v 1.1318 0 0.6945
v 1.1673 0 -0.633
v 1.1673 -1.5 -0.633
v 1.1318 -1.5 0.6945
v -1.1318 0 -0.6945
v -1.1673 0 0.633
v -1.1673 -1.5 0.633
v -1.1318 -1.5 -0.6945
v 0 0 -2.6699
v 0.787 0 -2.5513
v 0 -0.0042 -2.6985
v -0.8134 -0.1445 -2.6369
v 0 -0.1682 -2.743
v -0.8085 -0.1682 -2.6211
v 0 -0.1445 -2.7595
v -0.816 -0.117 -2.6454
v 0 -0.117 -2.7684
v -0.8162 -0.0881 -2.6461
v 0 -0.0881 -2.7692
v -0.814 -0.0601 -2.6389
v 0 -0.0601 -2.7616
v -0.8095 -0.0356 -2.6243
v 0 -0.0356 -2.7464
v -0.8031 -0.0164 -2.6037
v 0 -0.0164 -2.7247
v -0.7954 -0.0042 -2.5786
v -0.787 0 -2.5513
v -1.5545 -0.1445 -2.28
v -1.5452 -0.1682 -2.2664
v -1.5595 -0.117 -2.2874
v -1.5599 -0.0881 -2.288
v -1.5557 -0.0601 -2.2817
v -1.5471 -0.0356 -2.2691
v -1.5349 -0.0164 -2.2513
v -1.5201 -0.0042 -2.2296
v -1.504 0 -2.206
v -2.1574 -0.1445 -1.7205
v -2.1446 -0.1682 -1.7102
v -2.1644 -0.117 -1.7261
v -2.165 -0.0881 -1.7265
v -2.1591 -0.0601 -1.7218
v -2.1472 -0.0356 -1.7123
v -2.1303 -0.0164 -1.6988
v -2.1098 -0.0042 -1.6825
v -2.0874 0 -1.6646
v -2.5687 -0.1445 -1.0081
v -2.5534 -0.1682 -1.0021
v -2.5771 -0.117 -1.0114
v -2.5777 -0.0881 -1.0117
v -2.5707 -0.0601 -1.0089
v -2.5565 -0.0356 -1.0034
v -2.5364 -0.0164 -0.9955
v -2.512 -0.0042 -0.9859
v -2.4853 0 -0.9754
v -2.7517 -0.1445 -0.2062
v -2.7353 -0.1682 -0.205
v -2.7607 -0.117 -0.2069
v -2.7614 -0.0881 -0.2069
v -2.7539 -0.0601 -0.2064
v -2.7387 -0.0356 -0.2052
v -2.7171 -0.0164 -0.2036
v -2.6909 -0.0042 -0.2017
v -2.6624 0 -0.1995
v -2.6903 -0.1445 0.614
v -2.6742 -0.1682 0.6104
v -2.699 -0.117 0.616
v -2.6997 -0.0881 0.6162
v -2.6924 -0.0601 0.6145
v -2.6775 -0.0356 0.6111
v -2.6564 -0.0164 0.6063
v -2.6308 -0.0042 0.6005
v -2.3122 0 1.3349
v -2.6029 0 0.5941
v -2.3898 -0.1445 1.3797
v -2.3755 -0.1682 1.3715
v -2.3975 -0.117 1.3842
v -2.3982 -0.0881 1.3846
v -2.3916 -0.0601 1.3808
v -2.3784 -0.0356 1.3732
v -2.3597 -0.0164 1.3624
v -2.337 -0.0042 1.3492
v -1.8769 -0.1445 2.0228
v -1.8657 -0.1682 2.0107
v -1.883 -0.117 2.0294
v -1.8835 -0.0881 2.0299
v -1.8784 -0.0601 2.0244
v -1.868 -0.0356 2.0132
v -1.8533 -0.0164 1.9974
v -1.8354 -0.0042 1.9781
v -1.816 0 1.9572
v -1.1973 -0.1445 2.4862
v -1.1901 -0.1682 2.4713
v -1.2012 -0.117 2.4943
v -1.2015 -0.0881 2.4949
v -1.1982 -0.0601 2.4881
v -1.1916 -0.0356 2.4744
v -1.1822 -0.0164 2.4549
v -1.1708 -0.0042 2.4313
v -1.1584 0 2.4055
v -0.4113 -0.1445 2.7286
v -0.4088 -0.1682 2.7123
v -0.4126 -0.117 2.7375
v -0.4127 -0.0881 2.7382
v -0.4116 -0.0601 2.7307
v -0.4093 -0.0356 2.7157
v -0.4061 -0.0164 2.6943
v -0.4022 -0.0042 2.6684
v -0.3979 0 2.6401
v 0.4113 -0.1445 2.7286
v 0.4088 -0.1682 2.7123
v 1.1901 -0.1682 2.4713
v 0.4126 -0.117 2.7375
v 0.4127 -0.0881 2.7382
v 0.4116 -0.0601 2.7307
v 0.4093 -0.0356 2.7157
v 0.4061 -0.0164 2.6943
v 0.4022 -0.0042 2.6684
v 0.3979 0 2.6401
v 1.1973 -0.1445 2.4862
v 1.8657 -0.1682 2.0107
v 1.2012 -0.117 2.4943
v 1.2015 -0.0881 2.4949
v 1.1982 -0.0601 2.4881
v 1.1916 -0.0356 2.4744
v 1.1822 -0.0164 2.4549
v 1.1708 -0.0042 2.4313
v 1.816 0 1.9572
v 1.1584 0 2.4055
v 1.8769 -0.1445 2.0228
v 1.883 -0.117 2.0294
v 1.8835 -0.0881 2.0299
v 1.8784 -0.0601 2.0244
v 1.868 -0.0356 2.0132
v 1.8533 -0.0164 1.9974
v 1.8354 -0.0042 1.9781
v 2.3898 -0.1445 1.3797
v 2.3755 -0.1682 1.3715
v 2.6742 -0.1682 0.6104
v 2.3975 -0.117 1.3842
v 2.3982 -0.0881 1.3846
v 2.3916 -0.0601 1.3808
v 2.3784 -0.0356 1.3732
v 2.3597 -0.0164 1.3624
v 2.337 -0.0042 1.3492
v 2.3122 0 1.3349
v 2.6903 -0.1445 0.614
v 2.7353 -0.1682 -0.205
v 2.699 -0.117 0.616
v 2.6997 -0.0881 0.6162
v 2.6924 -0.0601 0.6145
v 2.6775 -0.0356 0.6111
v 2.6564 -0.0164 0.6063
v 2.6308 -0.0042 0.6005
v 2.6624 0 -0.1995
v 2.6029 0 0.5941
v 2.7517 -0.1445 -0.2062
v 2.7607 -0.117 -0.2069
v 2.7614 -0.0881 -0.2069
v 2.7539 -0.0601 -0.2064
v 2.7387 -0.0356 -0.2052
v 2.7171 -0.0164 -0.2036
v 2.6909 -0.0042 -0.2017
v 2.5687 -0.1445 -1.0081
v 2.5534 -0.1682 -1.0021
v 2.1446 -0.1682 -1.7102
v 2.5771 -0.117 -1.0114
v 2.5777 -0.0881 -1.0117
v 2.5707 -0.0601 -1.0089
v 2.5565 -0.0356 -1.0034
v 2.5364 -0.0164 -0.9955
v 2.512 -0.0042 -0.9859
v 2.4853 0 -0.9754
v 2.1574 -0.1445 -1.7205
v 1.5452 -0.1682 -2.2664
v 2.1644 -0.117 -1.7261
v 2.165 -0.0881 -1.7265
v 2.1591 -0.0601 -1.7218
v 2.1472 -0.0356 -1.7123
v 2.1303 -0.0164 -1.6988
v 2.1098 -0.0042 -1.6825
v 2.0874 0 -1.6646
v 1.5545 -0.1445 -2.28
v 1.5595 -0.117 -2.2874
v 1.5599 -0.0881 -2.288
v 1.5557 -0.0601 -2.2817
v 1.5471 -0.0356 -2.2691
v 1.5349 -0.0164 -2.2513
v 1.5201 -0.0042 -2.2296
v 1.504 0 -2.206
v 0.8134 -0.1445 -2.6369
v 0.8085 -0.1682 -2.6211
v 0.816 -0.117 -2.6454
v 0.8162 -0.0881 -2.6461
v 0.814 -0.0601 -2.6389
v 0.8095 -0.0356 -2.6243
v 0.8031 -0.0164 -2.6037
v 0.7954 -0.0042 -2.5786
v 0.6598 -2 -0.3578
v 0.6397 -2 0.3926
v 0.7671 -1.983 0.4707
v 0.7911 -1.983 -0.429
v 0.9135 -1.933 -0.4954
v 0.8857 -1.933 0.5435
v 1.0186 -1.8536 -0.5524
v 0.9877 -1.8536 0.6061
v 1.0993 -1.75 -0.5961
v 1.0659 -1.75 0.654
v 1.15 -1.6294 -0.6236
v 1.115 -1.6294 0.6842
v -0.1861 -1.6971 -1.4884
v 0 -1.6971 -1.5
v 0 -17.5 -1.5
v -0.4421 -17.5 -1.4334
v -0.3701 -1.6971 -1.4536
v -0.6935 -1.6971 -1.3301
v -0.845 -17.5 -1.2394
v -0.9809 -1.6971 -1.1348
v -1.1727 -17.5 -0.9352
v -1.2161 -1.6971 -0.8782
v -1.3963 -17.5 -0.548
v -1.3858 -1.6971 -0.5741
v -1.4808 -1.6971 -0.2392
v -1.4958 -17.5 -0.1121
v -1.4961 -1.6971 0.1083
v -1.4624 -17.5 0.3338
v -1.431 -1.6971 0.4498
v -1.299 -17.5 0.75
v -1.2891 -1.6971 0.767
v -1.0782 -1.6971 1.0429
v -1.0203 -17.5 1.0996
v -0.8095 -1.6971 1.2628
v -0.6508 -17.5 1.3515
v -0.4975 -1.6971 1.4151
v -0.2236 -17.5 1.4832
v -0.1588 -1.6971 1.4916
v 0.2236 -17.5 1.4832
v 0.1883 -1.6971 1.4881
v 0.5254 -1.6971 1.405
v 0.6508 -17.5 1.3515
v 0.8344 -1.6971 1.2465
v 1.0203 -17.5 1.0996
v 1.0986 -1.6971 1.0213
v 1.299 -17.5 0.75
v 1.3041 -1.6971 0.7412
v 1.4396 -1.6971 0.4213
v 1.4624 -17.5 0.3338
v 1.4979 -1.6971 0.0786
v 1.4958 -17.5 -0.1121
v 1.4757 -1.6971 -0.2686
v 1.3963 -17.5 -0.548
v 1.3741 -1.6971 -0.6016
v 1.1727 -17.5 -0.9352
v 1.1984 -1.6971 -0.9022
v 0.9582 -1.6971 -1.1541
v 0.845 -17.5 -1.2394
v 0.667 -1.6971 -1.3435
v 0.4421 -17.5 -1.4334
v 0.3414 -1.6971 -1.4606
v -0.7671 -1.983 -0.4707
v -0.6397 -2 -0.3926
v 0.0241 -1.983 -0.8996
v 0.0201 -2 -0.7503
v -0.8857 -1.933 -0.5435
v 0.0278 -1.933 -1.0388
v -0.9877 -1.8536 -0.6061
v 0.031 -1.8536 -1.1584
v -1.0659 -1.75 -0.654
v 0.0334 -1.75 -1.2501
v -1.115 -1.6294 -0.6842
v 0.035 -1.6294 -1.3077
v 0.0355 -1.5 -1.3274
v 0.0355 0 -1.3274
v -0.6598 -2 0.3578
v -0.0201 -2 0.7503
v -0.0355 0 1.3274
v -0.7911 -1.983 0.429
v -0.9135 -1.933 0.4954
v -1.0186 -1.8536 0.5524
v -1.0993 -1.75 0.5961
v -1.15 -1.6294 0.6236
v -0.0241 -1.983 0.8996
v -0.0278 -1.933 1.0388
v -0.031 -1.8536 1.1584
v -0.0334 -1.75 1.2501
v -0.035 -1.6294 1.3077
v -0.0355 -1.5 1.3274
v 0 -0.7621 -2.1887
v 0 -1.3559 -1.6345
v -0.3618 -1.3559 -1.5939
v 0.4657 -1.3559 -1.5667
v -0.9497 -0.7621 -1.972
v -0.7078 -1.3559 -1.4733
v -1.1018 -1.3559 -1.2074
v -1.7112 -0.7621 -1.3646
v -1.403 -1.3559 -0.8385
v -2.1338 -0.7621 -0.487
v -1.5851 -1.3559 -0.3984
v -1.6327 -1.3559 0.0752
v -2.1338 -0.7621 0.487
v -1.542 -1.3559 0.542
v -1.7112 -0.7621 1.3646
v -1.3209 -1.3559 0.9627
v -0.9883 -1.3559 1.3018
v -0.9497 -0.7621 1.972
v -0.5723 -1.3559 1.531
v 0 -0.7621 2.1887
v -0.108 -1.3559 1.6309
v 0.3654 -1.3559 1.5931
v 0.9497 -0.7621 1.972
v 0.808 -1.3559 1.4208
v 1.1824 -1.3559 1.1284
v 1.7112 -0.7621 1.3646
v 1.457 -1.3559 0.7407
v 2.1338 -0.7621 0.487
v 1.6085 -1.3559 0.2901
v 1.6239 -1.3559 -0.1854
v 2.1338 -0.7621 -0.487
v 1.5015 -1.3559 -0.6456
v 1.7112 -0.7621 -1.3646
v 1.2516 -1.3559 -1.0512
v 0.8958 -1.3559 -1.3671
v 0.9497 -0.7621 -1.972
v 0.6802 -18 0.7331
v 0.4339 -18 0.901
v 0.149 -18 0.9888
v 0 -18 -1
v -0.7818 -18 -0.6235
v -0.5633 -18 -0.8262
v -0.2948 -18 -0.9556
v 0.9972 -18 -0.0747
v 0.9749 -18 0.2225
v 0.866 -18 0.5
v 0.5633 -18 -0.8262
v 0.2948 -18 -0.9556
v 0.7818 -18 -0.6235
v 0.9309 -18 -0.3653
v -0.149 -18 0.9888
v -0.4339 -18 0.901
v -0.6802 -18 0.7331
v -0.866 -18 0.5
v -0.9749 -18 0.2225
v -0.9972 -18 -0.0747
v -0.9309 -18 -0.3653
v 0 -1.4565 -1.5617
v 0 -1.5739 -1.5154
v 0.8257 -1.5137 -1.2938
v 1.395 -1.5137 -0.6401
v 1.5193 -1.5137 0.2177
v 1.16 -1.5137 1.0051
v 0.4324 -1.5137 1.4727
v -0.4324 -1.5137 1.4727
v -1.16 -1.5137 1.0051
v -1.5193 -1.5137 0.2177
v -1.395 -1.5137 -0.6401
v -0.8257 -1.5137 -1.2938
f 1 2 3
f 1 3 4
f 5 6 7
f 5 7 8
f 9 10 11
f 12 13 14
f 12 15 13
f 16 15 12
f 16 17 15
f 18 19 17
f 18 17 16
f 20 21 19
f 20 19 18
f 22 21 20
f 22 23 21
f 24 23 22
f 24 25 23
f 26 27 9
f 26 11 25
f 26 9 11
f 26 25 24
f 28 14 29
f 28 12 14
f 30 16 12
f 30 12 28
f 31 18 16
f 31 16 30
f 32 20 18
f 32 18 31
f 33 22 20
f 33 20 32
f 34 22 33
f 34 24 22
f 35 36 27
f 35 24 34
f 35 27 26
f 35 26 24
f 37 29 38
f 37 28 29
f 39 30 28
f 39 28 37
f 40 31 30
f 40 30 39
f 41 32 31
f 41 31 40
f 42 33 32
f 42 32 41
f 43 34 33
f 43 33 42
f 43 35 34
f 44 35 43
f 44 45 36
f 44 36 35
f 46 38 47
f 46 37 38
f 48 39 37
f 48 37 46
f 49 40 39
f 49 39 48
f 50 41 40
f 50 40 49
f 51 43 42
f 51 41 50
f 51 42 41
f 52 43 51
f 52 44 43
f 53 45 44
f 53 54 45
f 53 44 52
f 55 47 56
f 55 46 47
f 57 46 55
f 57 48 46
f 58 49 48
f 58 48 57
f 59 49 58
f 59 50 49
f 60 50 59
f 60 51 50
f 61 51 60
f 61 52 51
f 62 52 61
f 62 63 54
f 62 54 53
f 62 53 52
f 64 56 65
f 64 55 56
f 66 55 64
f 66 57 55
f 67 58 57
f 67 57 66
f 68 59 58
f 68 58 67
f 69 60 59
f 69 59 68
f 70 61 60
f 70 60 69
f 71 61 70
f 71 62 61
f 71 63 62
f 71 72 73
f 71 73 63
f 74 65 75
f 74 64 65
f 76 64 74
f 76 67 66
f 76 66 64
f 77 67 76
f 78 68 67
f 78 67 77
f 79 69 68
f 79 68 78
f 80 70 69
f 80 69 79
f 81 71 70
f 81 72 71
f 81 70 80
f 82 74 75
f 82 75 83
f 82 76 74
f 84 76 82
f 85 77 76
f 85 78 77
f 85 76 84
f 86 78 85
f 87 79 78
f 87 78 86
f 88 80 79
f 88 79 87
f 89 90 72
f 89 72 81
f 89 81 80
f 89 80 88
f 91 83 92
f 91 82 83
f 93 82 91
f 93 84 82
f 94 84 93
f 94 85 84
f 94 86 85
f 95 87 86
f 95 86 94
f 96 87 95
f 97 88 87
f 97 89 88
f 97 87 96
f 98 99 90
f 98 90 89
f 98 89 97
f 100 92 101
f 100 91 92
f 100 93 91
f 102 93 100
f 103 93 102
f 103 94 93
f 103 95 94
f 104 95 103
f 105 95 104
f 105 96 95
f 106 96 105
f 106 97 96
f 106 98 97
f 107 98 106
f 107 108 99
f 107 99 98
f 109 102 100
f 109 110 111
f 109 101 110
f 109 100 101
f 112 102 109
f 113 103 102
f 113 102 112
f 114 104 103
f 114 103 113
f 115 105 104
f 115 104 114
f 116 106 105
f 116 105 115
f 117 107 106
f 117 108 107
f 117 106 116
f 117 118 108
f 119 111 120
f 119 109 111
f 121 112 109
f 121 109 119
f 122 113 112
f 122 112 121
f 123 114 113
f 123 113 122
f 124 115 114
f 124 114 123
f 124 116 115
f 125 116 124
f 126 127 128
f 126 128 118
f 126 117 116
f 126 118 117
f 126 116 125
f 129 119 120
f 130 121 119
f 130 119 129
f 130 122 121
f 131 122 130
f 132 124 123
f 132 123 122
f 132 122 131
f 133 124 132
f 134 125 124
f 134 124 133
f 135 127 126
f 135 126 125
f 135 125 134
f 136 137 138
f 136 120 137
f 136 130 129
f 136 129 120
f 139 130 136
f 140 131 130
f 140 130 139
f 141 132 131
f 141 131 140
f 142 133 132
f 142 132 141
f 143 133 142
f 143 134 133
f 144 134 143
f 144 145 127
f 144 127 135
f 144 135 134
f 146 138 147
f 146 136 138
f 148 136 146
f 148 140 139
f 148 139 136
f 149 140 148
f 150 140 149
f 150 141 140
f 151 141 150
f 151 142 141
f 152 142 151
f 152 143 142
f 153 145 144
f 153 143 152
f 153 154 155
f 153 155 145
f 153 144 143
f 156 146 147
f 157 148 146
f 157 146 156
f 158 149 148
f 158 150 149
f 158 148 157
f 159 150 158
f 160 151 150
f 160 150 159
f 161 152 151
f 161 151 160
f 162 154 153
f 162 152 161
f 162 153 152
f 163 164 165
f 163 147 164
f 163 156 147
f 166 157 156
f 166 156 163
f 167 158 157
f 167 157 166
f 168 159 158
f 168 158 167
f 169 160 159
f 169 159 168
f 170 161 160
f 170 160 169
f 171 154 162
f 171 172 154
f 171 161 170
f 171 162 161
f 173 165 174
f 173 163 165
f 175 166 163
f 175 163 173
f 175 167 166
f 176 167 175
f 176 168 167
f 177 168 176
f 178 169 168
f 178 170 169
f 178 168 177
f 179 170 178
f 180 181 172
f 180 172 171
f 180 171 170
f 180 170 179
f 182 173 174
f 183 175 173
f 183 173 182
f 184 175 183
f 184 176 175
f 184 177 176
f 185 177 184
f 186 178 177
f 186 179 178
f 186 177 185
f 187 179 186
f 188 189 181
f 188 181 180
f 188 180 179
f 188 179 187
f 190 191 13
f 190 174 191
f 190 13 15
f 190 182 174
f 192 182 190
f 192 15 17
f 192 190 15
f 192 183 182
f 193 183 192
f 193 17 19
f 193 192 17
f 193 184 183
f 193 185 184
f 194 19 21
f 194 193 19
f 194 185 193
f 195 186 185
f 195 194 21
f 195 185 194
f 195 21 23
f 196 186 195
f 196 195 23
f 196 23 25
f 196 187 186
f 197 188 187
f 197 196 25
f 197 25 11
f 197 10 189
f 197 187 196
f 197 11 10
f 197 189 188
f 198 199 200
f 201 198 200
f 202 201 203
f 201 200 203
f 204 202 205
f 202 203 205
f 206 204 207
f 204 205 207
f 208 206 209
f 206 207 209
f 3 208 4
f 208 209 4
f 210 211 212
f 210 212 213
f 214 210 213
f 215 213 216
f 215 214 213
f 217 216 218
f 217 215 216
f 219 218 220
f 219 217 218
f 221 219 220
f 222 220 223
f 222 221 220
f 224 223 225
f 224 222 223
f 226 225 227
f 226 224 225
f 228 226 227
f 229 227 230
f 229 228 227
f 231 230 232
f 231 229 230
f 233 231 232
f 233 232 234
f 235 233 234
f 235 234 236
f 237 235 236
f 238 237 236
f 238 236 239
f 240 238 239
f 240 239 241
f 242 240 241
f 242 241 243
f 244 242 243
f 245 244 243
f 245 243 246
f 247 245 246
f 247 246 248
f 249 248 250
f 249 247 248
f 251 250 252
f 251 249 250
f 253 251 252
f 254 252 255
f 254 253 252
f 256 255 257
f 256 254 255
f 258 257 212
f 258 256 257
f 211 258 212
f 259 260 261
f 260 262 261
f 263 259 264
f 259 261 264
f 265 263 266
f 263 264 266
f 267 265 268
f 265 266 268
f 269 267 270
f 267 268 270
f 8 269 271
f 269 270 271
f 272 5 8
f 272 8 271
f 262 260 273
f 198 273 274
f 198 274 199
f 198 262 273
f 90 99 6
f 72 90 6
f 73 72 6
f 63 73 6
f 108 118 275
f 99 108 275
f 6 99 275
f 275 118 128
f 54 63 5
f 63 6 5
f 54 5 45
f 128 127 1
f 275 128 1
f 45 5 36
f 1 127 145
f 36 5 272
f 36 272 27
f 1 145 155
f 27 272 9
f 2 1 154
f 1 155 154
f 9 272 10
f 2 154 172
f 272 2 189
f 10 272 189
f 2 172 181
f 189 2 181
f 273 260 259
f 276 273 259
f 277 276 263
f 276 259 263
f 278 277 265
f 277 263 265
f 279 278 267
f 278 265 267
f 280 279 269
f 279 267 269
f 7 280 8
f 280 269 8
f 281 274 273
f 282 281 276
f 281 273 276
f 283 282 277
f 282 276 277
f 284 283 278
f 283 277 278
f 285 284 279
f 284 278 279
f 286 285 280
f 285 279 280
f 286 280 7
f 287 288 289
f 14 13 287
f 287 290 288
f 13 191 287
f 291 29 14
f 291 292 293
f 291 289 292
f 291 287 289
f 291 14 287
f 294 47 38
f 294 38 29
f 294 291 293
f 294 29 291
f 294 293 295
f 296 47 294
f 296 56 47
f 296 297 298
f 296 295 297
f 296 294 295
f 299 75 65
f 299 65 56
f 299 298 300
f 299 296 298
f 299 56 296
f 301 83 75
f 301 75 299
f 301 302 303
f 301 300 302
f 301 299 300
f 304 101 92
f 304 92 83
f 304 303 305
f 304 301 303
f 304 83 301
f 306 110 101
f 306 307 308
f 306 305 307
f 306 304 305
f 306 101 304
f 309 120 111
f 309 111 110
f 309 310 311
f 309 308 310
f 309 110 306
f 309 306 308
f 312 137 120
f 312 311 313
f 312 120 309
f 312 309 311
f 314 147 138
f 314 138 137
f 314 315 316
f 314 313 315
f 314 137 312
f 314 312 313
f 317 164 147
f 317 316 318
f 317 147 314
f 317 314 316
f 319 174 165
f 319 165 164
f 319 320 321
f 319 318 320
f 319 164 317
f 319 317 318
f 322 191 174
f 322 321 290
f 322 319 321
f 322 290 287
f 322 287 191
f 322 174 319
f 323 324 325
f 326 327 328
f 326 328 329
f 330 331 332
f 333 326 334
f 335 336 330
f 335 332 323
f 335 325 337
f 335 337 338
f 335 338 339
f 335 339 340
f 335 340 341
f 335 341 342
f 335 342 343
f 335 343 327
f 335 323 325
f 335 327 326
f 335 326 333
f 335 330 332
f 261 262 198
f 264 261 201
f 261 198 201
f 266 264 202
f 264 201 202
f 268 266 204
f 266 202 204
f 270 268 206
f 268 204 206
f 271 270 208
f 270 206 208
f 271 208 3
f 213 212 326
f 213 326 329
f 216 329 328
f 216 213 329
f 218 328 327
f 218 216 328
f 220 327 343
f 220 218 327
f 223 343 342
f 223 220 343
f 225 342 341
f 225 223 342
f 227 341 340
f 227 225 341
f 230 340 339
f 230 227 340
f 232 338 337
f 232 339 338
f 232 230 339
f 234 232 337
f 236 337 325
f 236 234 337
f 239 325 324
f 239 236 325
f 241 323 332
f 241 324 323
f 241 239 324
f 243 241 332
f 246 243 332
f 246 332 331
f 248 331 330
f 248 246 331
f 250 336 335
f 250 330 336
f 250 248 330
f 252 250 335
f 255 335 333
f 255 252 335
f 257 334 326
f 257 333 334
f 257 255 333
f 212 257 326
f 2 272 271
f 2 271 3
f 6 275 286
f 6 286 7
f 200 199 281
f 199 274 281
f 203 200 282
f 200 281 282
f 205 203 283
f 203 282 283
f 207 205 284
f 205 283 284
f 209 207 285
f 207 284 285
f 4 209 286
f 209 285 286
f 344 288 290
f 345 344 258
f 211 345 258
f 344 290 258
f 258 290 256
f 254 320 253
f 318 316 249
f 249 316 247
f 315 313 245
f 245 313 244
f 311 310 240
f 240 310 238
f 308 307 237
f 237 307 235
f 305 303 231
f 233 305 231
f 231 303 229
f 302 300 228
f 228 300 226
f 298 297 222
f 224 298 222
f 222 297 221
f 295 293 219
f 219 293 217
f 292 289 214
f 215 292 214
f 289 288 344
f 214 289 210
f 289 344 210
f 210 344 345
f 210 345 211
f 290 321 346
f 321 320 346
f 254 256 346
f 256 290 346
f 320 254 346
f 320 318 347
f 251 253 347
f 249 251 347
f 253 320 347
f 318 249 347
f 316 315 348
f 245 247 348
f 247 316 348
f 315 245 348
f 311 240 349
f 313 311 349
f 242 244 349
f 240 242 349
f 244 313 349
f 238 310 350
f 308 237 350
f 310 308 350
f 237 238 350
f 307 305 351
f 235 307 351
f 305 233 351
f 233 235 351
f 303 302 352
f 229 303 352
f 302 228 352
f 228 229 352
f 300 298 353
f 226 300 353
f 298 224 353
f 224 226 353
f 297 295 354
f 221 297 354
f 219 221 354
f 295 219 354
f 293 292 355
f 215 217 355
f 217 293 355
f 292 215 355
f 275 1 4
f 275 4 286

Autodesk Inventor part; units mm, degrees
ref_plane "YZ Plane" through (0, 0, 0) normal (1, 0, 0) x (0, 1, 0)
ref_plane "XZ Plane" through (0, 0, 0) normal (0, 1, 0) x (-1, 0, 0)
ref_plane "XY Plane" through (0, 0, 0) normal (0, 0, 1) x (1, 0, 0)
sketch "Szkic2" plane through (0, 0, 0) normal (1, 0, 0) x (0, 1, 0)
  line L0 (0, -2.9) -> (0, 2.9)
  line L1 (-1.5, -1.5) -> (-1.5, 1.5)
  line L2 (-1.5, -1.5) -> (0, -2.9)
  line L3 (-1.5, 1.5) -> (0, 2.9)
  line L4 (0, 0) -> (-18, 0)
  line L5 (-18, 0) -> (-18, -1.5)
  line L6 (-18, -1.5) -> (-1.5, -1.5)
  dimension "d0" = 5.8
  dimension "d2" = 3
  dimension "d3" = 1.5
  dimension "d4" = 18
  dimension "d5" = 1.5
revolve "Obrót1" add sketch "Szkic2" angle 360 about axis through (0, 0, 0) along (0, -1, 0) contours L2 L1 L4 L0 | L6 L5 L4 L1
sketch "Szkic3" plane through (0, 0, 0) normal (0, 1, 0) x (1, 0, 0)
  line L0 (-1.1673, -0.633) -> (-1.1318, 0.6945)
  line L1 (-1.1318, 0.6945) -> (0.0355, 1.3274)
  line L2 (0.0355, 1.3274) -> (1.1673, 0.633)
  line L3 (1.1673, 0.633) -> (1.1318, -0.6945)
  line L4 (1.1318, -0.6945) -> (-0.0355, -1.3274)
  line L5 (-0.0355, -1.3274) -> (-1.1673, -0.633)
  point P0 (0, 0)
  point P1 (0, 0)
  dimension "d7" = 2.3
extrude "Wyciągnięcie proste1" cut sketch "Szkic3" against normal blind 2
fillet "Zaokrąglenie1" radius 0.5 6 edges at (-1.1496, -2, -0.0308) (-0.6014, -2, 0.9802) (-0.5482, -2, -1.011) (0.6014, -2, -0.9802) (0.5482, -2, 1.011) (1.1496, -2, 0.0308)
fillet "Zaokrąglenie2" radius 0.5 1 edges at (0, -1.5, 1.5)
fillet "Zaokrąglenie3" radius 0.1 1 edges at (0, 0, 2.9)
thread "Gwint1" size "M3x0.5" class "6g" standard "ANSI Metric M Profile" full length
chamfer "Faza1" distance 0.5 angle 45 1 edges at (0, -18, 1.5)
properties part number "Screw M3 18mm flat head"
